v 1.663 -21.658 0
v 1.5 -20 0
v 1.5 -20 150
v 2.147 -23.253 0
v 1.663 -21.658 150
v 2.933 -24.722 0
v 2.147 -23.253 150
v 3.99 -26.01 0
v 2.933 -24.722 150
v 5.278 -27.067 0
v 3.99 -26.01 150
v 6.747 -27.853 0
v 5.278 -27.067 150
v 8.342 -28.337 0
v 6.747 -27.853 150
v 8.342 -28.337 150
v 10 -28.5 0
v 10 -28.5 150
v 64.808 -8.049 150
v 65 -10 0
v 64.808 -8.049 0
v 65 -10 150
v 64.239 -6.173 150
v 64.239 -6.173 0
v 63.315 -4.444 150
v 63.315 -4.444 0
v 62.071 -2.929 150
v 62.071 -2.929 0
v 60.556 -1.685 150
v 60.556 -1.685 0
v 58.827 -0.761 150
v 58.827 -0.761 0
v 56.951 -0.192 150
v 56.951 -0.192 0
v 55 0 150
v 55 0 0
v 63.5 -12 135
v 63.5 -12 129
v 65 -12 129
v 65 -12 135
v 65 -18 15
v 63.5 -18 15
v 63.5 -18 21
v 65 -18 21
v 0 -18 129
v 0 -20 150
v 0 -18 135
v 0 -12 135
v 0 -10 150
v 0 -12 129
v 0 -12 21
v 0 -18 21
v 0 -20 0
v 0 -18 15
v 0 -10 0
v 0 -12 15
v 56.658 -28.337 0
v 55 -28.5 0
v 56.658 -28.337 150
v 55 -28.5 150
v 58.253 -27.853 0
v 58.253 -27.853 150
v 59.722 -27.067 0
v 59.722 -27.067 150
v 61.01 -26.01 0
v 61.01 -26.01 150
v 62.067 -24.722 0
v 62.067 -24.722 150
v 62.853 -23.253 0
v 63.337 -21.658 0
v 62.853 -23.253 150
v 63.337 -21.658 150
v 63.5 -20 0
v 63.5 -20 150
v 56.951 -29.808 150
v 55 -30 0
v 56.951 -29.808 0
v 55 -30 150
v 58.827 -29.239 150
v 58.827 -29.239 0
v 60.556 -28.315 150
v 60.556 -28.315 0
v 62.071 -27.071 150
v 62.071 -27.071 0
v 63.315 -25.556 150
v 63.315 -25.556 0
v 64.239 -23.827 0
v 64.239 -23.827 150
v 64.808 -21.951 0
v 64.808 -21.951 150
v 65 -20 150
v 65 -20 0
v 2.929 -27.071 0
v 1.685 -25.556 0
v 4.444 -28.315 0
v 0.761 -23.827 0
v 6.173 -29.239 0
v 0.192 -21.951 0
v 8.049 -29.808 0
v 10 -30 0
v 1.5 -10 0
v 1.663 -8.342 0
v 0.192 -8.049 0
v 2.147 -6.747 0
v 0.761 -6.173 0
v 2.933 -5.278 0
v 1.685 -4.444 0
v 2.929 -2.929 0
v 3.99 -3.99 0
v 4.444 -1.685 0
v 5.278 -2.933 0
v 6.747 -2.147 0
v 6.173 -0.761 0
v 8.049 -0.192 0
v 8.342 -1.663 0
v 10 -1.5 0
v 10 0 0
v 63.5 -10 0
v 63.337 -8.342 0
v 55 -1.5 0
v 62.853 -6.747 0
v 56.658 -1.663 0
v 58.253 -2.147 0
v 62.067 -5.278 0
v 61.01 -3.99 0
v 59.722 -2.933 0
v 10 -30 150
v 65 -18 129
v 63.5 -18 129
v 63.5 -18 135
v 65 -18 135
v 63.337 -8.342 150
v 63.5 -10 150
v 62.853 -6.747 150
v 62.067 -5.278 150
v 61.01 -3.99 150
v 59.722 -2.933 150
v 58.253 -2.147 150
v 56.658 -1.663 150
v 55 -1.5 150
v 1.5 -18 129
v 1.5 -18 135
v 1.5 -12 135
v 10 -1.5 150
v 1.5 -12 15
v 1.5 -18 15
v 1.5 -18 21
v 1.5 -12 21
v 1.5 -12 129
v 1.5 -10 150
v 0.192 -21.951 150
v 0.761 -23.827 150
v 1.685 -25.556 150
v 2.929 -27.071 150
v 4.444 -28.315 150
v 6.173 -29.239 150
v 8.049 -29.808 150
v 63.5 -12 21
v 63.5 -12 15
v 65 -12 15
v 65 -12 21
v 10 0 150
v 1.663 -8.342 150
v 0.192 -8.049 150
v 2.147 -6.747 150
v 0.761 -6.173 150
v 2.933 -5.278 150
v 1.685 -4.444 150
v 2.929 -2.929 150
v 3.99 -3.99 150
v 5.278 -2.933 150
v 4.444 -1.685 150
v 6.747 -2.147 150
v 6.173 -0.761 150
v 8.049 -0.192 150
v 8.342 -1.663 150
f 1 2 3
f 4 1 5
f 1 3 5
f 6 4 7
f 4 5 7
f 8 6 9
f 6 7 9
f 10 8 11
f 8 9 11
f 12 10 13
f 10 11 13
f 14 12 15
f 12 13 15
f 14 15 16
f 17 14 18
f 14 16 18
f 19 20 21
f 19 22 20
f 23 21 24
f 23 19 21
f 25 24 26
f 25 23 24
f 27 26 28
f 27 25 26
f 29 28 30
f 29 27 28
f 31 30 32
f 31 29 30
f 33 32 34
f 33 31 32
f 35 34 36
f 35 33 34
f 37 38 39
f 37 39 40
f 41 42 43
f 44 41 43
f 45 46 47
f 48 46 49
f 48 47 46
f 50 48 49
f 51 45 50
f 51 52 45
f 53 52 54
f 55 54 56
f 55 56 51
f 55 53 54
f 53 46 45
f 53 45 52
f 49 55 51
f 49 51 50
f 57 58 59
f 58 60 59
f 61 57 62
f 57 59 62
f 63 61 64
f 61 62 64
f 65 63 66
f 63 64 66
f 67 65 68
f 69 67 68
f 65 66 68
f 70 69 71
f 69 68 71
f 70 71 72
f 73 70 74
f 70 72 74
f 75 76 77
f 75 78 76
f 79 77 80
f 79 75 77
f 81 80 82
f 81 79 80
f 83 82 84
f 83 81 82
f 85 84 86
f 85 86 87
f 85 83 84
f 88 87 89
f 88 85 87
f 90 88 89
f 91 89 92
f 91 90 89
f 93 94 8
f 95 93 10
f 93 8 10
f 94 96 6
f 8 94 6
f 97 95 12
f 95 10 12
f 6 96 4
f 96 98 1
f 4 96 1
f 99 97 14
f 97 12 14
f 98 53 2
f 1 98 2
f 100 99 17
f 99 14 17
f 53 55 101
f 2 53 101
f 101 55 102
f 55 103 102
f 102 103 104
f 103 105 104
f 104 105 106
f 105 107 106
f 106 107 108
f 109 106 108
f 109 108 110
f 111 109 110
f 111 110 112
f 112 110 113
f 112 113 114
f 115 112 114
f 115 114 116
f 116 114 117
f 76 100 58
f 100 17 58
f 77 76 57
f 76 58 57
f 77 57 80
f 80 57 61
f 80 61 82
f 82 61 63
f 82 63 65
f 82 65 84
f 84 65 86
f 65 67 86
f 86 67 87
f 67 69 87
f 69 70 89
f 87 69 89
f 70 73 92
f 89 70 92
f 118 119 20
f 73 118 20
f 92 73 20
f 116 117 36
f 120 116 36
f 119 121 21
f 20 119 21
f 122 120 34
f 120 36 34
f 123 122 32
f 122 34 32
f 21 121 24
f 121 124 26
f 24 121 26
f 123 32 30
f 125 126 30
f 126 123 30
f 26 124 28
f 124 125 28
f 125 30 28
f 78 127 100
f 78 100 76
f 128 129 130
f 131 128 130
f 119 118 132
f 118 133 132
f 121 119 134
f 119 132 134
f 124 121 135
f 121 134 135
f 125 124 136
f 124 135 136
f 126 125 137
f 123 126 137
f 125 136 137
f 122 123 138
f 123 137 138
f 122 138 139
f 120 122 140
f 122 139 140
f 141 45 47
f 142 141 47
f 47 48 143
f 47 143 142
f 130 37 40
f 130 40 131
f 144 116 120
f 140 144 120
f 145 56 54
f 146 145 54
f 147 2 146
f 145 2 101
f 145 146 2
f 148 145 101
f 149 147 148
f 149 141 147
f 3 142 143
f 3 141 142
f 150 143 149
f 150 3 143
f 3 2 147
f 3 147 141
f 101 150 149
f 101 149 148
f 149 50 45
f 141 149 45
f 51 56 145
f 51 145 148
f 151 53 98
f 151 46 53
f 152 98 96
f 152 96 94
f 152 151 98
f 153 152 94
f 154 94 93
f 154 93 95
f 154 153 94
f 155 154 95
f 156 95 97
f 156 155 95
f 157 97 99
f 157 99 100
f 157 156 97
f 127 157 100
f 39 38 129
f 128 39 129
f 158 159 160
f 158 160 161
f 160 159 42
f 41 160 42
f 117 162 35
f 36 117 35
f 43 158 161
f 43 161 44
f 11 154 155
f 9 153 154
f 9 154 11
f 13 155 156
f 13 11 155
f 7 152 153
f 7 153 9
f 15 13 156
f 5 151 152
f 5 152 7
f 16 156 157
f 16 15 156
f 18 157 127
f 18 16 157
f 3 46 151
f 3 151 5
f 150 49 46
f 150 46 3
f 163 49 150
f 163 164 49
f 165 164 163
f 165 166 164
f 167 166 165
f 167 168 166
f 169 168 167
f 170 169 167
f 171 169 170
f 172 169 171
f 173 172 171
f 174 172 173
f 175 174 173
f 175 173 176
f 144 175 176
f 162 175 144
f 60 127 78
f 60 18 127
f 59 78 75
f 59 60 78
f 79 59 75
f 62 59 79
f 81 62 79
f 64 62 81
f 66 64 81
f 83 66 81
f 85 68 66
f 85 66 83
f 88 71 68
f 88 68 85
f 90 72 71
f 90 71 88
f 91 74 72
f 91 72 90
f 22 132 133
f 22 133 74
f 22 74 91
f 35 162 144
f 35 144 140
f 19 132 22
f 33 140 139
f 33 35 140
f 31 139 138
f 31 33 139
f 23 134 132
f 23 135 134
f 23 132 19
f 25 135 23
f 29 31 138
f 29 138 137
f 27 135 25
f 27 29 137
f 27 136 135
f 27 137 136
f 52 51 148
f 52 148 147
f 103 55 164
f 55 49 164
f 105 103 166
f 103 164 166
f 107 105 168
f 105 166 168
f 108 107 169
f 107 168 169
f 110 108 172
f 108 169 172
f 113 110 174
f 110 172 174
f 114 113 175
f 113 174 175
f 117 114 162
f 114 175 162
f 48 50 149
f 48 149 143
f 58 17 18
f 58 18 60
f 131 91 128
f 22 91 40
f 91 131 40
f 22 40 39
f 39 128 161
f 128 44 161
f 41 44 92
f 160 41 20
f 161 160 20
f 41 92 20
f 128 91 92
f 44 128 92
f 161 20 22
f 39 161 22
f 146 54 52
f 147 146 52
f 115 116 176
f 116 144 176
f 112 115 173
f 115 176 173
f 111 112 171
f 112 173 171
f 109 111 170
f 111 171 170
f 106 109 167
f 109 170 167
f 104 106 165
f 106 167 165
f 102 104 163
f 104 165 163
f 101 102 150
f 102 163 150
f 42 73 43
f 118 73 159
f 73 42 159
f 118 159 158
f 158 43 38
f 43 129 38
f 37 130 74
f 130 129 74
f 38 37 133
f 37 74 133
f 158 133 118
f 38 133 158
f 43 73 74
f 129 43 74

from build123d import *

# Parameters (mm, degrees)
F0_W     = 65
F0_H     = 30
F1_DEPTH = 150
F2_R     = 10
F3_T     = -1.5
F4_DEPTH = 1.5
F5_W     = 6
F5_H     = 6
F6_DEPTH = 65.001


with BuildPart() as f1:
    # F0 (on Top) → F1 (new body)
    with BuildSketch(Plane.XY):
        with Locations((32.5, -15)):
            Rectangle(F0_W, F0_H)
    extrude(amount=F1_DEPTH)

    # F2
    f2_edges = [f1.edges().sort_by_distance(p)[0] for p in [
        (65, 0, 75),
        (65, -30, 75),
        (0, 0, 75),
        (0, -30, 75),
    ]]
    fillet(f2_edges, radius=F2_R)

    # F3
    f3_openings = [f1.faces().sort_by_distance(p)[0] for p in [
        (32.5, -15, 150),
    ]]
    offset(amount=F3_T, openings=f3_openings)

    # F4 (cut, through all): a face of the model
    f4_faces = [f1.faces().sort_by_distance(p)[0] for p in [
        (32.5, -15, 1.5),
    ]]
    extrude(f4_faces, amount=-F4_DEPTH, mode=Mode.SUBTRACT)

    # F5 (on face) → F6 (cut, through all)
    with BuildSketch(Plane(origin=(0, 0, 0), x_dir=(0, -1, 0), z_dir=(-1, 0, 0))):
        with Locations((15, 18)):
            Rectangle(F5_W, F5_H)
        with Locations((15, 132)):
            Rectangle(F5_W, F5_H)
    extrude(amount=-F6_DEPTH, mode=Mode.SUBTRACT)


solid = f1.part
